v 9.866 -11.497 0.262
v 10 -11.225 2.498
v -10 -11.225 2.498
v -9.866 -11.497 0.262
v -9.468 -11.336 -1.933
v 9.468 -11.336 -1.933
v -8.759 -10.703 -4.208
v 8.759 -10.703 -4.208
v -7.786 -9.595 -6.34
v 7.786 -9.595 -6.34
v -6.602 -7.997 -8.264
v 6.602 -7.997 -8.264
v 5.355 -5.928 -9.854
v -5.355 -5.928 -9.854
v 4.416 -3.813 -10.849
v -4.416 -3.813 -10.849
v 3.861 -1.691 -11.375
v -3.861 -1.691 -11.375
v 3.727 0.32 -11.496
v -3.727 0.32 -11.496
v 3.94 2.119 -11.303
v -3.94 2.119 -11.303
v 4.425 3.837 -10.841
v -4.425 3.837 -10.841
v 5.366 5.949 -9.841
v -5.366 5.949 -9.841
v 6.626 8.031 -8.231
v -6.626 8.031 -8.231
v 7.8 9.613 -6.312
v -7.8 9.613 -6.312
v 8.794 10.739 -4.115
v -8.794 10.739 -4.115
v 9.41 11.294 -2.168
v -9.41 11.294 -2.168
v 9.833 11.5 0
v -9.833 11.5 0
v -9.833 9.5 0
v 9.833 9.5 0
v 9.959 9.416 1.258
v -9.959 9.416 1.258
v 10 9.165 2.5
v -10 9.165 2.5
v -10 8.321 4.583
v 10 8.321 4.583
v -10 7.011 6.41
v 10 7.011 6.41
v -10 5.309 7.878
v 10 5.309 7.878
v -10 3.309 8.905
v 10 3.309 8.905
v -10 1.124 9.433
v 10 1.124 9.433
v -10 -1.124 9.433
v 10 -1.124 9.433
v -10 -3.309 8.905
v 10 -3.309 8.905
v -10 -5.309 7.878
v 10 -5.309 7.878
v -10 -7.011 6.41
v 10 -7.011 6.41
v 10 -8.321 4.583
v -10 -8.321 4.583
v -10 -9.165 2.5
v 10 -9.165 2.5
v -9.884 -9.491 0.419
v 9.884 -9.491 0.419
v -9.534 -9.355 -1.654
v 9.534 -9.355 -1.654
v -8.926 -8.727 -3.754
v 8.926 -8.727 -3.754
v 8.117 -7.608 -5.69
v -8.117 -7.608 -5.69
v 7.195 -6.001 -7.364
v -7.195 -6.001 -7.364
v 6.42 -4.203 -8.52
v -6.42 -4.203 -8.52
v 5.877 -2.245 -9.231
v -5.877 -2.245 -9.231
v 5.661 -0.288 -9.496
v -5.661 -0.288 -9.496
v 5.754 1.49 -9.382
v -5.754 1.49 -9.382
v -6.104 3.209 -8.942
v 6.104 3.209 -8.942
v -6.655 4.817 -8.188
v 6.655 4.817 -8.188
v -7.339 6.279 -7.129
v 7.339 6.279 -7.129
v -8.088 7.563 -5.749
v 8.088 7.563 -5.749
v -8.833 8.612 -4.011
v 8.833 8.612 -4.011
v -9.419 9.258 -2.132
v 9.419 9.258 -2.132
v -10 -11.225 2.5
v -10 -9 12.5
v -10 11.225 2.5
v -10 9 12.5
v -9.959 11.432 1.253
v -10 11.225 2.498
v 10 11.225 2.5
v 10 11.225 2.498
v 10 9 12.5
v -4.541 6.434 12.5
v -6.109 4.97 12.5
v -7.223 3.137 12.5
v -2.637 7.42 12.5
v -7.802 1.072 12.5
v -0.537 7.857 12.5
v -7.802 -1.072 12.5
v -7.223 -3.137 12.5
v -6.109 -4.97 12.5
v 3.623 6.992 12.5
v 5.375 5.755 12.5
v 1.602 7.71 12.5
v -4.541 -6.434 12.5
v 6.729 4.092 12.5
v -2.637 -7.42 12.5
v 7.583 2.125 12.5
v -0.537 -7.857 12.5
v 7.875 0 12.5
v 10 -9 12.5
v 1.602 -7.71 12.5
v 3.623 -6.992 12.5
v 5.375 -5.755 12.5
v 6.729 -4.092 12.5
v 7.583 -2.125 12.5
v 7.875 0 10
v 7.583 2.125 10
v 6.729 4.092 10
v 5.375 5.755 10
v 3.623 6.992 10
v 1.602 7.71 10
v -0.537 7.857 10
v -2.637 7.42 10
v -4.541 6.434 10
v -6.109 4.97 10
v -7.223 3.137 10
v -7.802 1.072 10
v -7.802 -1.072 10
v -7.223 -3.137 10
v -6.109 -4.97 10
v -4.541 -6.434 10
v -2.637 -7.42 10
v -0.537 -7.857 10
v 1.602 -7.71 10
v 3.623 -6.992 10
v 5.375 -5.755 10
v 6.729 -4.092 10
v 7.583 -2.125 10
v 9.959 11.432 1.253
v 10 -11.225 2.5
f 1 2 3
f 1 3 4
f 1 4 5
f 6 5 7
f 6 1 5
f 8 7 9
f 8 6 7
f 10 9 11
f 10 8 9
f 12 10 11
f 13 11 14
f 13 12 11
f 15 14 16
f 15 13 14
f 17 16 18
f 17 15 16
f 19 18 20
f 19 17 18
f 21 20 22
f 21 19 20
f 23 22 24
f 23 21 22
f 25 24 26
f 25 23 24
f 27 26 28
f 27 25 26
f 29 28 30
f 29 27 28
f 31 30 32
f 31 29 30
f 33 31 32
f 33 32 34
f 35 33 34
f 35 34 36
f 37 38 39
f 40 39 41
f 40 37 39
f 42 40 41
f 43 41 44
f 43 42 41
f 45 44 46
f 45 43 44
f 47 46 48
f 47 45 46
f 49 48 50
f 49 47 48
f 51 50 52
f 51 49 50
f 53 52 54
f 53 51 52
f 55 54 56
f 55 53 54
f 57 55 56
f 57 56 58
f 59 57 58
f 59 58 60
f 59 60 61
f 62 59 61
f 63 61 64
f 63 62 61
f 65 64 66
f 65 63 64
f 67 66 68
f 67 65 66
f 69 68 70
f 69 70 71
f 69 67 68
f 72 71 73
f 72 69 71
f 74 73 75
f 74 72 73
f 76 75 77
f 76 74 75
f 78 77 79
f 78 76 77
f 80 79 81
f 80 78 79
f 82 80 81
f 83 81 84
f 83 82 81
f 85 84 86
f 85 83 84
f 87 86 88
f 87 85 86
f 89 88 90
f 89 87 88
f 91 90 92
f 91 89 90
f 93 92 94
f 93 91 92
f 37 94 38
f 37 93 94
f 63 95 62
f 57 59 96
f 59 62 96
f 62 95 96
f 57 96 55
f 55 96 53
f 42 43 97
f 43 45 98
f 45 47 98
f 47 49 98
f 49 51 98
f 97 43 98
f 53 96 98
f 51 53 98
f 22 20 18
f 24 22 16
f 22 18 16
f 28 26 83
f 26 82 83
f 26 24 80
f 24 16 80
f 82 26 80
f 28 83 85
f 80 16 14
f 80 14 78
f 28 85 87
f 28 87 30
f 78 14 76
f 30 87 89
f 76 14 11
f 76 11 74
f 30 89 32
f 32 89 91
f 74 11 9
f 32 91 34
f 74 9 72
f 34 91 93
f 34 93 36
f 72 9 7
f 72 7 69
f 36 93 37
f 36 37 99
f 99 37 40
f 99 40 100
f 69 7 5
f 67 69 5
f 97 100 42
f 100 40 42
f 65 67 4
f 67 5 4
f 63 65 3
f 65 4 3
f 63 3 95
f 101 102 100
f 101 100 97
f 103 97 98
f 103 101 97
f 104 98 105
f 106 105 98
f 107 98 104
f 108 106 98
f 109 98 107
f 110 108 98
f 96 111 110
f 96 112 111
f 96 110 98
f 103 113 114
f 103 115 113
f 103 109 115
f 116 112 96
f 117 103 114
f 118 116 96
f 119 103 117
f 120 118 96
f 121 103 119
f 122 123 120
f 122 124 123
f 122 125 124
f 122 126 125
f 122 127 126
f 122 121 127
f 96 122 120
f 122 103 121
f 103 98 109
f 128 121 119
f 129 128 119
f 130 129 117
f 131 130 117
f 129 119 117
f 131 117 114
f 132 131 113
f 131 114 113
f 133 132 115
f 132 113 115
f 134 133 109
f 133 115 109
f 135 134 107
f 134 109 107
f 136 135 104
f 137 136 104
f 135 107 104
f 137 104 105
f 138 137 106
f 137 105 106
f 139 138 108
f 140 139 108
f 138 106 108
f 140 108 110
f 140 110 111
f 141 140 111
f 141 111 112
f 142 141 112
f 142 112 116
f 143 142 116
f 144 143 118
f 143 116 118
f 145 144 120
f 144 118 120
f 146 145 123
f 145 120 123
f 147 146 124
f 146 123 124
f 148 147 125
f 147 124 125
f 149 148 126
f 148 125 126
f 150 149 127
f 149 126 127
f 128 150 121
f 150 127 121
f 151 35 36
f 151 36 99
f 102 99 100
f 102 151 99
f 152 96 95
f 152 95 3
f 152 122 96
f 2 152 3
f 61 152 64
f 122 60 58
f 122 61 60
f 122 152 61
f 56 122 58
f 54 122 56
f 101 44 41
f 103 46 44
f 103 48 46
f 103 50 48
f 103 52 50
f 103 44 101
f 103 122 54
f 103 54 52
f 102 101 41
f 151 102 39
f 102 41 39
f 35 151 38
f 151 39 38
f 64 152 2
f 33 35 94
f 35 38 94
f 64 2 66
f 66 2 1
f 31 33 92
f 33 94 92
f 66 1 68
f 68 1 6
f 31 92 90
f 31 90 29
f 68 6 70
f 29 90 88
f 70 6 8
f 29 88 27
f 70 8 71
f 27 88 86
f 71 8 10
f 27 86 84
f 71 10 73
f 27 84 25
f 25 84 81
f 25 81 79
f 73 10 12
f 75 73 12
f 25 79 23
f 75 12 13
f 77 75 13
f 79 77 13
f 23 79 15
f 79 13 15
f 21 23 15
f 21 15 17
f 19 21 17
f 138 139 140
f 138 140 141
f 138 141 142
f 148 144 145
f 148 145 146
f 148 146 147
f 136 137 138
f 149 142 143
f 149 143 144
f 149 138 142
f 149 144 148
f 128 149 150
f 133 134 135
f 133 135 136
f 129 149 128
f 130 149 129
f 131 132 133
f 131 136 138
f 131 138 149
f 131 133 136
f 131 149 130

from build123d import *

# Parameters (mm, degrees)
F0_R     = 9.5
F1_DEPTH = 10
F3_DEPTH = 15
F4_R     = 7.875
F5_DEPTH = 2.5


with BuildPart() as f1:
    # F0 (on Right) → F1 (new body, symmetric)
    with BuildSketch(Plane.YZ):
        with BuildLine():
            ThreePointArc((-11.225497, 2.497642), (-1.256341, -11.431168), (11.5, 0))
            ThreePointArc((11.5, 0), (11.431168, 1.256341), (11.225497, 2.497642))
            ThreePointArc((11.225497, 2.497642), (0, 11.5), (-11.225497, 2.497642))
        make_face()
        Circle(F0_R, mode=Mode.SUBTRACT)
        with BuildLine():
            ThreePointArc((-11.225497, 2.497642), (0, 11.5), (11.225497, 2.497642))
            Line((11.225497, 2.497642), (9, 12.5))
            Line((9, 12.5), (-9, 12.5))
            Line((-9, 12.5), (-11.225497, 2.497642))
        make_face()
    extrude(amount=F1_DEPTH, both=True)

    # F2 (on Front) → F3 (cut, symmetric)
    with BuildSketch(Plane.XZ):
        with BuildLine():
            Line((10, 12.5), (10, 2.5))
            ThreePointArc((10, 2.5), (8.02051, -5.885255), (2.5, -12.5))
            Line((2.5, -12.5), (-2.5, -12.5))
            ThreePointArc((-2.5, -12.5), (-8.02051, -5.885255), (-10, 2.5))
            Line((-10, 2.5), (-10, 12.5))
            Line((-10, 12.5), (-15, 12.5))
            Line((-15, 12.5), (-15, -17.5))
            Line((-15, -17.5), (15, -17.5))
            Line((15, -17.5), (15, 12.5))
            Line((15, 12.5), (10, 12.5))
        make_face()
    extrude(amount=F3_DEPTH, both=True, mode=Mode.SUBTRACT)

    # F4 (on face) → F5 (cut)
    with BuildSketch(Plane.XY.offset(12.5)):
        Circle(F4_R)
    extrude(amount=-F5_DEPTH, mode=Mode.SUBTRACT)


solid = f1.part
